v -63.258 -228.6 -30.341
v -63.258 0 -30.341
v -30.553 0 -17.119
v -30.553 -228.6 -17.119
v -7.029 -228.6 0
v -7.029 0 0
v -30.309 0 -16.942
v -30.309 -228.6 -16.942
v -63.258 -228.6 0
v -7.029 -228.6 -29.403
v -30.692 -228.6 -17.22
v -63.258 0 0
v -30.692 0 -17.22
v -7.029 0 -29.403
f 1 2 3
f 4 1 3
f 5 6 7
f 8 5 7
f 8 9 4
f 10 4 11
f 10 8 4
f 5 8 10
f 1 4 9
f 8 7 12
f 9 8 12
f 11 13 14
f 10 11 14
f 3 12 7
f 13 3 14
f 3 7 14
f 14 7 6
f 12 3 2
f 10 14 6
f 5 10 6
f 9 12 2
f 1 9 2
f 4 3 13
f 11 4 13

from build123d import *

# Parameters (mm, degrees)
F1_DEPTH = 228.6
F3_DEPTH = 228.6


with BuildPart() as f1:
    # F0 (on Front) → F1 (new body)
    with BuildSketch(Plane.XZ):
        Polygon((-63.258275, -30.340541), (-30.223398, -16.986018), (-63.258275, 0), align=None)
    extrude(amount=F1_DEPTH)

    # F2 (on Front) → F3 (join)
    with BuildSketch(Plane.XZ):
        Polygon((-7.028698, 0), (-30.691978, -17.220307), (-7.028698, -29.403383), align=None)
    extrude(amount=F3_DEPTH)


solid = f1.part
